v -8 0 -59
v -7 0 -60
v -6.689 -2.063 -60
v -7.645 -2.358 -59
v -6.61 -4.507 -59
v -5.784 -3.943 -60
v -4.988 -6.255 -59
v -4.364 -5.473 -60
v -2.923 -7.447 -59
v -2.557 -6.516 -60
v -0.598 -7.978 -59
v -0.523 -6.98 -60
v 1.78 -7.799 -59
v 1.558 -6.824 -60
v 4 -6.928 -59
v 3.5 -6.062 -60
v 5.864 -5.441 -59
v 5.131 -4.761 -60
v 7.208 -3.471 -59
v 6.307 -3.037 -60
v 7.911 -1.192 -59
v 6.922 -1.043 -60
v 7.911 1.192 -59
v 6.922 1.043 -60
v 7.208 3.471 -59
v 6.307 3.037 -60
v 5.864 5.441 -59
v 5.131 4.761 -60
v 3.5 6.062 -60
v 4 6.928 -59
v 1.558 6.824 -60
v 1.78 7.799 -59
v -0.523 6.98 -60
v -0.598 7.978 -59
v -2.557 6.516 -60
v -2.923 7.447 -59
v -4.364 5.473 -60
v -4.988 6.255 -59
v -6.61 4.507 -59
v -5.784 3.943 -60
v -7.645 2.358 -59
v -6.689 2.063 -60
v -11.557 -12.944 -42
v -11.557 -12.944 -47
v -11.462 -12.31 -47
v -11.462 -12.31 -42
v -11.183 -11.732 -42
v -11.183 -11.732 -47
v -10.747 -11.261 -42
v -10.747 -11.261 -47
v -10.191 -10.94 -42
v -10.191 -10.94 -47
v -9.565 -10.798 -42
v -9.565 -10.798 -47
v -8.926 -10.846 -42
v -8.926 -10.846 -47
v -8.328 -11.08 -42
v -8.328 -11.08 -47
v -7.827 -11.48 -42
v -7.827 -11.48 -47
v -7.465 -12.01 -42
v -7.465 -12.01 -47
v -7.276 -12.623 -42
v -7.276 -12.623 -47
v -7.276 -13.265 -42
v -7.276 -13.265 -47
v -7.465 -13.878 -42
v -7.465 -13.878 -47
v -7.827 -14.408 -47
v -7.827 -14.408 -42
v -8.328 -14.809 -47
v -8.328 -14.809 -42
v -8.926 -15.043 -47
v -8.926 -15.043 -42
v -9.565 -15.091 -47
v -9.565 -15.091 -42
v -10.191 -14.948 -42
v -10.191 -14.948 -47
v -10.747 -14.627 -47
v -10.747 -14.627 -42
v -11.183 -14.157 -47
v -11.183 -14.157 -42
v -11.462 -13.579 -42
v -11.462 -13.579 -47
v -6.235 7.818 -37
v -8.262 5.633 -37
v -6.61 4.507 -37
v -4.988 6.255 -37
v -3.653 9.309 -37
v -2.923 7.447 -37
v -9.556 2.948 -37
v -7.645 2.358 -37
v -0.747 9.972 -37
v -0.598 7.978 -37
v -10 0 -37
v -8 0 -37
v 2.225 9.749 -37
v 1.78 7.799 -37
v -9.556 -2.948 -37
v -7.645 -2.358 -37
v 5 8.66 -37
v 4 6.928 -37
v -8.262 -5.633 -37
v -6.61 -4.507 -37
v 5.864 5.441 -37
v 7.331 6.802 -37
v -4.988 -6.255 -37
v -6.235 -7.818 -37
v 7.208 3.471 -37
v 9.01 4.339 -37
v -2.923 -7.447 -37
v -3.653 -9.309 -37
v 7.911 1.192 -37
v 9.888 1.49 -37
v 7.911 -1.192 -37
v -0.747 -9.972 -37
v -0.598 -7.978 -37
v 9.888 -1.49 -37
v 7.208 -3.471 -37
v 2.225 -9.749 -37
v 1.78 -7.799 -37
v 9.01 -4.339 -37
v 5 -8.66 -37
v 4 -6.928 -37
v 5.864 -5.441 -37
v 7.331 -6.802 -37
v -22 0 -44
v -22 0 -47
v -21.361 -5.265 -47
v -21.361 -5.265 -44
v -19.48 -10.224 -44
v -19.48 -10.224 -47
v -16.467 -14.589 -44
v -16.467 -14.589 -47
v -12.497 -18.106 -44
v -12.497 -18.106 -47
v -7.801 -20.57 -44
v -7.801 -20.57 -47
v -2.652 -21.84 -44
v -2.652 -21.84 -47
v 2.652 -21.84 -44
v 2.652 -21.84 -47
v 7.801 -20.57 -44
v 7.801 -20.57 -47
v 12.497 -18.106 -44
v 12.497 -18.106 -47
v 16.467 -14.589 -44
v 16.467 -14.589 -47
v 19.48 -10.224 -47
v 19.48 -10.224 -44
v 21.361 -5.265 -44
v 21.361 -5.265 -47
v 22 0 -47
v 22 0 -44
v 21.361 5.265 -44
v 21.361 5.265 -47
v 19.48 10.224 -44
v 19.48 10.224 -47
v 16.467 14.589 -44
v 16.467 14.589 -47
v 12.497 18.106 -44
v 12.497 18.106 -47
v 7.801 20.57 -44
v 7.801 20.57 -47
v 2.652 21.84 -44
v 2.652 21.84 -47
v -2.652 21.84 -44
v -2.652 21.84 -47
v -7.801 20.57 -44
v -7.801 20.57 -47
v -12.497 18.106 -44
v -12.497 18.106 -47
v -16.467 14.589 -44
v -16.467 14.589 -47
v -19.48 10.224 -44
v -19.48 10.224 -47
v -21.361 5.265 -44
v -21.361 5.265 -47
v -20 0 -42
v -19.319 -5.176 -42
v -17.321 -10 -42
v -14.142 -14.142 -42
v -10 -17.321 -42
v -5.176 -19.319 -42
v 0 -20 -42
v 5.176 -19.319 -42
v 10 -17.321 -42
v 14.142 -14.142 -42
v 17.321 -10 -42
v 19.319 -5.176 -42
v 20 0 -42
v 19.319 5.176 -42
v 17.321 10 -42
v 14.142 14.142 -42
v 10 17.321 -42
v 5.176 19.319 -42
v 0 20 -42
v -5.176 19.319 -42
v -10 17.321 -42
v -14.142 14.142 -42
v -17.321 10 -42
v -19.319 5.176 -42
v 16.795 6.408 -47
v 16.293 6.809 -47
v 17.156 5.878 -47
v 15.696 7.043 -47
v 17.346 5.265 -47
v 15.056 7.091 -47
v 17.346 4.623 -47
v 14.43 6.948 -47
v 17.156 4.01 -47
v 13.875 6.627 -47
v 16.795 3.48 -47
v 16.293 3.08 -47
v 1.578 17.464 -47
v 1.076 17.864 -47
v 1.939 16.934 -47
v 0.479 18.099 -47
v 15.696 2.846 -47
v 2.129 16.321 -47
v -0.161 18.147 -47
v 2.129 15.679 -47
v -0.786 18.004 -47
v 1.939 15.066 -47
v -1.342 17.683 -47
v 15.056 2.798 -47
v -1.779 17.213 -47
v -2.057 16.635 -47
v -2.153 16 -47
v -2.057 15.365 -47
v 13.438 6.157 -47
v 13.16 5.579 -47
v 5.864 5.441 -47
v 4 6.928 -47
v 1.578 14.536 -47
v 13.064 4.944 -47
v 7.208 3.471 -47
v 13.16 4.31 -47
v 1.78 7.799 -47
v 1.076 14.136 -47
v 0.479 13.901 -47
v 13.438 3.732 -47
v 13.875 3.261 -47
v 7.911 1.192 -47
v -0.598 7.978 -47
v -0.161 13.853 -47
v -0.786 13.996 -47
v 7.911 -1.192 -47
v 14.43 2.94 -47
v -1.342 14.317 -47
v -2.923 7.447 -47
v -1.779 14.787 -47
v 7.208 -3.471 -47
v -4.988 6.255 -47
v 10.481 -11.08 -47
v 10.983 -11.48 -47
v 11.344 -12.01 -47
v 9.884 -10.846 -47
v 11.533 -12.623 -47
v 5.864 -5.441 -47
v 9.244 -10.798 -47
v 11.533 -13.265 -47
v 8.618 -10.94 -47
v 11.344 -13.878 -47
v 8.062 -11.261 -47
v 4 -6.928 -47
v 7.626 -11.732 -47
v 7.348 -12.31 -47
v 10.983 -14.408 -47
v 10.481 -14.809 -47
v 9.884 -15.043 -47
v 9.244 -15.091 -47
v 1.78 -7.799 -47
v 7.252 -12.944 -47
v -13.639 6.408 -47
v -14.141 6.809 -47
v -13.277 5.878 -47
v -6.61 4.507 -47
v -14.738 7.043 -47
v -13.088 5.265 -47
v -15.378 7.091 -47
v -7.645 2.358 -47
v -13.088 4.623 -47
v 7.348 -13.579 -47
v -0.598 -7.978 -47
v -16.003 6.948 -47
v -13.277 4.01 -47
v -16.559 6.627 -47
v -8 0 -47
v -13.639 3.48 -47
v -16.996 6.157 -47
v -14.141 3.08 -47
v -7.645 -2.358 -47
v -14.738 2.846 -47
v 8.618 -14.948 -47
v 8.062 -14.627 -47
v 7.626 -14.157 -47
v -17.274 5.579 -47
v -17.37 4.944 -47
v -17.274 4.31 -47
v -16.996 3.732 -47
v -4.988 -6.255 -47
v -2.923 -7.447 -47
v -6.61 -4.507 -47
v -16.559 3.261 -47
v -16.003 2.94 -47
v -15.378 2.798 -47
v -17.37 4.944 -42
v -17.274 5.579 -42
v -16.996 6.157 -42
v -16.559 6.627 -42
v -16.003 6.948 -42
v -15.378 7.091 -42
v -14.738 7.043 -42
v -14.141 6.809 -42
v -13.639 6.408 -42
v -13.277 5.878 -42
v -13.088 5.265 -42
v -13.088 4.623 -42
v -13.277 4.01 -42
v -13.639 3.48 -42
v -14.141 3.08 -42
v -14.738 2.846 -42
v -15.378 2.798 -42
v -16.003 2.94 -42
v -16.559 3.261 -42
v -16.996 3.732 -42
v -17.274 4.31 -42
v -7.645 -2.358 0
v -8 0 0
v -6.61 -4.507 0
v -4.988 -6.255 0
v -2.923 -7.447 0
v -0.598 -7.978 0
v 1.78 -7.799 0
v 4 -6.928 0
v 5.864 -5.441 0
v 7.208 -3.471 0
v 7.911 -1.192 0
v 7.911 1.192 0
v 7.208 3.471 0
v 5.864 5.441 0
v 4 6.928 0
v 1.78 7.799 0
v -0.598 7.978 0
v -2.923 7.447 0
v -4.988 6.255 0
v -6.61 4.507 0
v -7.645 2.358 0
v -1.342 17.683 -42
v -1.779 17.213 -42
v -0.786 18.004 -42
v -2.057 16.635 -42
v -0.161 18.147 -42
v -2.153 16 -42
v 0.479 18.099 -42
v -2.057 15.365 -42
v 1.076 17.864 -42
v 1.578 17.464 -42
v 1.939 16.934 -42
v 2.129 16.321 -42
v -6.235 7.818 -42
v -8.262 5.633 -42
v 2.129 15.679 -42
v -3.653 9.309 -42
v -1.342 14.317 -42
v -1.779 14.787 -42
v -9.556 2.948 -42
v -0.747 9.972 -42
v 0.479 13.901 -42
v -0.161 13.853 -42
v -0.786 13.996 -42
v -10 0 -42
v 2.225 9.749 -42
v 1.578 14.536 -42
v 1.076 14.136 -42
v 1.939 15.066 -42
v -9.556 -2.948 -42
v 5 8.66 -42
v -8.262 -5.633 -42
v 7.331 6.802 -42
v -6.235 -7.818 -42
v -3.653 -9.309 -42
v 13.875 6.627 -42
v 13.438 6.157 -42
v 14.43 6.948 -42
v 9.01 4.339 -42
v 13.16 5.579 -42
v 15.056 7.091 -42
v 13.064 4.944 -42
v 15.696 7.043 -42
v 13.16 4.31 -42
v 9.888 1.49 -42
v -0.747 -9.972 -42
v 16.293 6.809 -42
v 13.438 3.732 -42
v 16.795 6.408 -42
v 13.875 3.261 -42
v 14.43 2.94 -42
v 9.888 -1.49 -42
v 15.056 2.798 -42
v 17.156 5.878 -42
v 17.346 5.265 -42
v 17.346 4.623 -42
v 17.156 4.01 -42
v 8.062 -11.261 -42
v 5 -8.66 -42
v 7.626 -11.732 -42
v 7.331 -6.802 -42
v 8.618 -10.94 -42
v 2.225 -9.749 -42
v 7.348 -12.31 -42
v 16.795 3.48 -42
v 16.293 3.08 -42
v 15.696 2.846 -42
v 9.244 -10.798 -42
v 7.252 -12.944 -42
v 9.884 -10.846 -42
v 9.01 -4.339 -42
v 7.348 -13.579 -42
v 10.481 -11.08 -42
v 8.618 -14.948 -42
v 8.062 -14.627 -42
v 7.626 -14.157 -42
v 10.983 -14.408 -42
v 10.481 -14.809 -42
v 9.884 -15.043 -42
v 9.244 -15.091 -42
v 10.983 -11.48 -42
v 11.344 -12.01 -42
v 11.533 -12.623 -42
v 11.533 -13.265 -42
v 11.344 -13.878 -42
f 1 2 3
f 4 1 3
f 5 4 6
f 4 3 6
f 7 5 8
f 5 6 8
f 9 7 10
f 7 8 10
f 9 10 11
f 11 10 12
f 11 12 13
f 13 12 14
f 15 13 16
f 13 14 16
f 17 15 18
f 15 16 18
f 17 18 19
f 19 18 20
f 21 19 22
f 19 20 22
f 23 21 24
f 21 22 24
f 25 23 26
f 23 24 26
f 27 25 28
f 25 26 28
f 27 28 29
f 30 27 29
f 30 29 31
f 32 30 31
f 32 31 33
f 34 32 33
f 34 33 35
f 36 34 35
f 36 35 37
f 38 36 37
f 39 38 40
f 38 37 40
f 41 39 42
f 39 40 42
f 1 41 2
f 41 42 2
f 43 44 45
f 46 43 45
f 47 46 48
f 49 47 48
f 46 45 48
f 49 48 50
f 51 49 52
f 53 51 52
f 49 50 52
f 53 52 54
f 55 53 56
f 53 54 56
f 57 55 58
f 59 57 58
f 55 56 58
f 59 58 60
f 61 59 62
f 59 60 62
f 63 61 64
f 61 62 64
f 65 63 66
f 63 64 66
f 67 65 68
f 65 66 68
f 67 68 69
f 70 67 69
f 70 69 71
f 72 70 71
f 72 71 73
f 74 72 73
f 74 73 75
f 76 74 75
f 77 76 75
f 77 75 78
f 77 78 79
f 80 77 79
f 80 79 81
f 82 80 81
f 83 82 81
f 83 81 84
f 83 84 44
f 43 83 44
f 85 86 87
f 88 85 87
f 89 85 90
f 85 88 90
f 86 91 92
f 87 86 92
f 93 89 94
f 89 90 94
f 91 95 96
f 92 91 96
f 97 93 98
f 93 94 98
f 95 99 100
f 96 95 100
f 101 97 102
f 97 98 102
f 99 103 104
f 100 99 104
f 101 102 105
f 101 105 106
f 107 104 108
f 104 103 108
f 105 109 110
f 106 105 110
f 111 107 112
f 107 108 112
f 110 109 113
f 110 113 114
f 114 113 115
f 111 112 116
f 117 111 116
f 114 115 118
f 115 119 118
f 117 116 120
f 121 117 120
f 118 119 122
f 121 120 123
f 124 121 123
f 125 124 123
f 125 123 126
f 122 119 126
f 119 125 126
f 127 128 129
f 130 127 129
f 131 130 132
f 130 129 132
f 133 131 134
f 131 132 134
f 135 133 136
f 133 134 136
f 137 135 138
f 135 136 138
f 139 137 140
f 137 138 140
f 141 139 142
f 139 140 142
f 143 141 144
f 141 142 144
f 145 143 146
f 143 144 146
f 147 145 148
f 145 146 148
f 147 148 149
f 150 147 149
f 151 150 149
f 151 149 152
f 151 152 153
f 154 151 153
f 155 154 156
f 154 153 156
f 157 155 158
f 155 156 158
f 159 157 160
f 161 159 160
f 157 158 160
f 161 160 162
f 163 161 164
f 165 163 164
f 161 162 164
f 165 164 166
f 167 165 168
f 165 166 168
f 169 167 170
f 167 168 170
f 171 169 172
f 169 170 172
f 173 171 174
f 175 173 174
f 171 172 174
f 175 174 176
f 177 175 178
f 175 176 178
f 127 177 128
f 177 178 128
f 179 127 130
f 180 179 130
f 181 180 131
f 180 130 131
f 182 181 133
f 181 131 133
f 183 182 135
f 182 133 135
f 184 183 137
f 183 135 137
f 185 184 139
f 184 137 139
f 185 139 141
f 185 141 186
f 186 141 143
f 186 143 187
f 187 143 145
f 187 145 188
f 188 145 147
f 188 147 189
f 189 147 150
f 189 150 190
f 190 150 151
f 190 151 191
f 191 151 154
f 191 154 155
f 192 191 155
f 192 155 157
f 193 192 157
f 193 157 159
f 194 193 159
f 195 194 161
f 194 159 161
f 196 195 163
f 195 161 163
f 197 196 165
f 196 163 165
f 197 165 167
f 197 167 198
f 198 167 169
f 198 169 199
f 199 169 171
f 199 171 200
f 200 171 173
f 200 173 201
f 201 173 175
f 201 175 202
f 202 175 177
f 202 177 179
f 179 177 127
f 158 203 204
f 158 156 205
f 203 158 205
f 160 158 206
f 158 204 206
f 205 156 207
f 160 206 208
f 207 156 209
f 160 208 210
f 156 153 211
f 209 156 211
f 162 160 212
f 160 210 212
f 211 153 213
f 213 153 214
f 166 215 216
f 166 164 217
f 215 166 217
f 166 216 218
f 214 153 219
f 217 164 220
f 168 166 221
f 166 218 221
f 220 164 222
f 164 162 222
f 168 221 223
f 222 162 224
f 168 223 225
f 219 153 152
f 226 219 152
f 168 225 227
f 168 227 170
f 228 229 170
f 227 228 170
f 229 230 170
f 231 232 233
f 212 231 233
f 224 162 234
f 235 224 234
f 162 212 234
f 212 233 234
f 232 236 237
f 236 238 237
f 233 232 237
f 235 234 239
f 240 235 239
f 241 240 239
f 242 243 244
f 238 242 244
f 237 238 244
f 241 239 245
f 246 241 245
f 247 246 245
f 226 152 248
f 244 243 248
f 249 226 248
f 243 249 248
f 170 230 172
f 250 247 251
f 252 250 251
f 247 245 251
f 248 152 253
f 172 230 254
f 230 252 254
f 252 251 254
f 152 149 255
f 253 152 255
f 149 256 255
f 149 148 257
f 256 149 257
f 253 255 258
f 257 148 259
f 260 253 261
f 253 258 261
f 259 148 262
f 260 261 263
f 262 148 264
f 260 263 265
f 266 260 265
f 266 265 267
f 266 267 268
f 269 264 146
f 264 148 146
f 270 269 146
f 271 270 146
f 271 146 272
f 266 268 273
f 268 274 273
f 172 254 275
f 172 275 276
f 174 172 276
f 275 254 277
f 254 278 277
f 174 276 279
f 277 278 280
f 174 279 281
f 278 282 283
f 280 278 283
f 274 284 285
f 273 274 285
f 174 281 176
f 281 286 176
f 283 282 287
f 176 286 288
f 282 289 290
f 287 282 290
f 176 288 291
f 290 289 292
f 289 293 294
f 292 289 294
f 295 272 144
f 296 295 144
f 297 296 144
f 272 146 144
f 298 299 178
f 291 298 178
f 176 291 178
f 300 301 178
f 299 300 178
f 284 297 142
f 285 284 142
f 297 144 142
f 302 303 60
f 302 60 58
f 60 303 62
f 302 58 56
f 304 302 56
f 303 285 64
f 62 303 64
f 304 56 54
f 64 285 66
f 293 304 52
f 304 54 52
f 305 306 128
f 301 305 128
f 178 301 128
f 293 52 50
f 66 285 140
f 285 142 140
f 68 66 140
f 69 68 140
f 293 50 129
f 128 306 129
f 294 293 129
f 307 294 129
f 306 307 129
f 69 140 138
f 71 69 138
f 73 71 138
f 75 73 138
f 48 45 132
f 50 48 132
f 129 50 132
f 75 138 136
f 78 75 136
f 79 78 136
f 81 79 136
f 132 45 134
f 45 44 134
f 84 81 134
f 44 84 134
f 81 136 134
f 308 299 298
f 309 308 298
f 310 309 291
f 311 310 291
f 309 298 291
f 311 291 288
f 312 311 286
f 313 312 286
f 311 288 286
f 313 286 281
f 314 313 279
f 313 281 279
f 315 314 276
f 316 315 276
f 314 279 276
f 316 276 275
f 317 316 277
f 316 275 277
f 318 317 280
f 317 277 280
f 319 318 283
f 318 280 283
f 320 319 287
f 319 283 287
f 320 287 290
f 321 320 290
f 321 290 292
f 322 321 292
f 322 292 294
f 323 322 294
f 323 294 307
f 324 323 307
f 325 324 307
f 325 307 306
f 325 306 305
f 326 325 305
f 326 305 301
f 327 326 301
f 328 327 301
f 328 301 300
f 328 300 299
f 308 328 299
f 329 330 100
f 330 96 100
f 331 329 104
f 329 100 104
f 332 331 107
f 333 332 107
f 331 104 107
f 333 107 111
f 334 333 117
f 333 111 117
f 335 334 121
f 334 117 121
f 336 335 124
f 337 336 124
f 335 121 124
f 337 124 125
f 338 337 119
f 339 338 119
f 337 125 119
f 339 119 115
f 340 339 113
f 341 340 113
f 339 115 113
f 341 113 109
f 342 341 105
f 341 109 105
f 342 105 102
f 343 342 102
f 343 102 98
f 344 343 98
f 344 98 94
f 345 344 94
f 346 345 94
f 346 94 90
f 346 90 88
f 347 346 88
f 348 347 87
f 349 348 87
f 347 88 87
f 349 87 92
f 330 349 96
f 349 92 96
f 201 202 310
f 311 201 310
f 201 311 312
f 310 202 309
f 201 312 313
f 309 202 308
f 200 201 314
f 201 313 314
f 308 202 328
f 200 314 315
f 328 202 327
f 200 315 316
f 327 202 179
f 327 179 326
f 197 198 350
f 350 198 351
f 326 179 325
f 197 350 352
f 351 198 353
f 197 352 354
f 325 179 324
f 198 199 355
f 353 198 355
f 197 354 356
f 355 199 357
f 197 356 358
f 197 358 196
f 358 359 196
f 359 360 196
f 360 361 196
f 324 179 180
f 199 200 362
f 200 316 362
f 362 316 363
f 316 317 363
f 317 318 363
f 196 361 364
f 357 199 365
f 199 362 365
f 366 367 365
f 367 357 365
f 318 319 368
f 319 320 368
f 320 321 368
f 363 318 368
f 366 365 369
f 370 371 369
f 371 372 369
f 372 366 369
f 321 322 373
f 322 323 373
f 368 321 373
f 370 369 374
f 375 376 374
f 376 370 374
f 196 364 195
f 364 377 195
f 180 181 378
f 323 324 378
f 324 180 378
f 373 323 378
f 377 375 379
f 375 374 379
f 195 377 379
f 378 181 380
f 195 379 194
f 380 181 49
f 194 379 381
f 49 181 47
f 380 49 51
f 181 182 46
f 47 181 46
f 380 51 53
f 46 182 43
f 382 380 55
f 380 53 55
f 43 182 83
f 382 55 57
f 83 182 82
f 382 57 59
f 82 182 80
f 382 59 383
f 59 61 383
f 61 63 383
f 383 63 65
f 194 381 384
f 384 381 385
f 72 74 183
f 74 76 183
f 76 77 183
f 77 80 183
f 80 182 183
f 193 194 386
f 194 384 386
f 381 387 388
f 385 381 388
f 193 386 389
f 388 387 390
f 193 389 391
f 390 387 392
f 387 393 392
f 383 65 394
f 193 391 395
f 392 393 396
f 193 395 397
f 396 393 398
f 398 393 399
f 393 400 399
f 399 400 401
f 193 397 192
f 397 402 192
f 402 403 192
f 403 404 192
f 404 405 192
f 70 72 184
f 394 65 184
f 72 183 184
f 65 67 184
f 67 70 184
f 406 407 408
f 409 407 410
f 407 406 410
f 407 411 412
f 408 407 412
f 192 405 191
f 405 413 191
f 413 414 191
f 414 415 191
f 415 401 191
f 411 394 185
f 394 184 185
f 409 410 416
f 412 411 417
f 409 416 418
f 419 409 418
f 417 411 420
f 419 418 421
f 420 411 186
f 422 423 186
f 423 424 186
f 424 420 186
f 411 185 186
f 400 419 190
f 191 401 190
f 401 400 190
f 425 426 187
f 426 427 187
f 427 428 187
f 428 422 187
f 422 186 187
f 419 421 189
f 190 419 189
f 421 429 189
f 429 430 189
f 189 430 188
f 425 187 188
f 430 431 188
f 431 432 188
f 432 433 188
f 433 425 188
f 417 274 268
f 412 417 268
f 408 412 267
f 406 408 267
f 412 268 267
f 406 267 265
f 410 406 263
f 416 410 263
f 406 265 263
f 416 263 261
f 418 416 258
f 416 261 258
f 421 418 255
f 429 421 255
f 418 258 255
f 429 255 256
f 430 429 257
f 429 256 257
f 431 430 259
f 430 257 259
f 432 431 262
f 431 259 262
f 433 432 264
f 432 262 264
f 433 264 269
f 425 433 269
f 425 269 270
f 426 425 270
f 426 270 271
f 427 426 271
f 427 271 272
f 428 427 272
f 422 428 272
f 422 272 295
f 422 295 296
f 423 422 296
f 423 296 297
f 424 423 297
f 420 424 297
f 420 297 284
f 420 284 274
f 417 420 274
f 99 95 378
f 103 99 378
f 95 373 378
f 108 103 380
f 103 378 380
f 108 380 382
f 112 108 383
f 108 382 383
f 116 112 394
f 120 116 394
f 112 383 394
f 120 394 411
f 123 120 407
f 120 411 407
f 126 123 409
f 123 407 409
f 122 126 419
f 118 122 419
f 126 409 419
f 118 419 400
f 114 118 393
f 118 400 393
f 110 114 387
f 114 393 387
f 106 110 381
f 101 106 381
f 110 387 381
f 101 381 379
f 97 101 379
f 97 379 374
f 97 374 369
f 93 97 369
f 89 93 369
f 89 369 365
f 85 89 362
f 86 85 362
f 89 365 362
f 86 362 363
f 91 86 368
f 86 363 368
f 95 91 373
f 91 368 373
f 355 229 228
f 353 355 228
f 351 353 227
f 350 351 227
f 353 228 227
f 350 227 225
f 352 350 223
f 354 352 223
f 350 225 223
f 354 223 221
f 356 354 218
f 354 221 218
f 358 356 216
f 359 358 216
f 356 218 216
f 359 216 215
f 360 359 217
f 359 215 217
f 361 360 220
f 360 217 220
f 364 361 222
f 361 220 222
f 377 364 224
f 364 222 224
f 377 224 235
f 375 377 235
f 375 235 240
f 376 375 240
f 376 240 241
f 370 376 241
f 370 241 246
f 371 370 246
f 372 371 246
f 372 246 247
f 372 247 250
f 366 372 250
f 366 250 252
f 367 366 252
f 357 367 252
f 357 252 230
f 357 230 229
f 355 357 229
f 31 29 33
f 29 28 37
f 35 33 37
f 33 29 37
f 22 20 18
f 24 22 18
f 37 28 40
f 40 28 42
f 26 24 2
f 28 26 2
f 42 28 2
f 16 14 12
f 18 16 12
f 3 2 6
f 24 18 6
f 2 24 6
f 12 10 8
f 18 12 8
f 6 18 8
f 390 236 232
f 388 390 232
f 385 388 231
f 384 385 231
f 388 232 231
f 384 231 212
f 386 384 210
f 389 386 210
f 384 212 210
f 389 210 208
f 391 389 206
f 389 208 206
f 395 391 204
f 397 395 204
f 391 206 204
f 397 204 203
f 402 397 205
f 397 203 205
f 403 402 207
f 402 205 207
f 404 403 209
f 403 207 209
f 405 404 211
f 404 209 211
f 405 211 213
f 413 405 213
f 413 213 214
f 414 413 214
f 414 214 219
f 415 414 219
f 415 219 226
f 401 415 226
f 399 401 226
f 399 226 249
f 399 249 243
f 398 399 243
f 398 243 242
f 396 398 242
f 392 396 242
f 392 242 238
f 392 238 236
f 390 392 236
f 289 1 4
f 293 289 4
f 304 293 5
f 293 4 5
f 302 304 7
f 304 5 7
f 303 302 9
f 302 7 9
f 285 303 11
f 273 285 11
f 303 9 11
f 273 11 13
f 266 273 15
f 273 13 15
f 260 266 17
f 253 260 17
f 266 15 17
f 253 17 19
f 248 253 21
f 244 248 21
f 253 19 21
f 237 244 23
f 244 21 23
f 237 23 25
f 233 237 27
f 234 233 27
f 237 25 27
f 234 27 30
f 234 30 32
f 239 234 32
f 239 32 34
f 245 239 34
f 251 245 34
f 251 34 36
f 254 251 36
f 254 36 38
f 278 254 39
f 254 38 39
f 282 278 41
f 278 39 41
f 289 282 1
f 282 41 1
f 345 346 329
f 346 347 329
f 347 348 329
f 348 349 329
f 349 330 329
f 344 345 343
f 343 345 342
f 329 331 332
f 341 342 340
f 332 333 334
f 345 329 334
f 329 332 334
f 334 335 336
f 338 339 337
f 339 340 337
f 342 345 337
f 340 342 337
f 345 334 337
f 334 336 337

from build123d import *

# Parameters (mm, degrees)
CHAMFER1_SIZE             = 2
F_8_CLEARANCE_HOLE1_D     = 4.3053
F_8_CLEARANCE_HOLE1_DEPTH = 12
F_8_CLEARANCE_HOLE1_TIP   = 1.293442612
CHAMFER2_SIZE             = 1


with BuildPart() as part:
    # Sketch3 → Revolve1 (revolve)
    with BuildSketch(Plane(origin=(0, 0, 0), x_dir=(1, 0, 0), z_dir=(0, 1, 0))):
        Polygon((0, 0), (-8, 0), (-8, 37), (-10, 37), (-10, 42), (-22, 42), (-22, 47), (-8, 47), (-8, 60), (0, 60), align=None)
    revolve(axis=Axis((0, 0, -60), (0, 0, 1)))

    # Chamfer1
    chamfer1_edges = [part.edges().sort_by_distance(p)[0] for p in [
        (22, 0, -42),
    ]]
    chamfer(chamfer1_edges, length=CHAMFER1_SIZE)

    # #8 Clearance Hole1
    with Locations(Plane.XY.offset(-42)):
        with Locations((0, 16), (15.216904261, 4.94427191), (9.404564037, -12.94427191), (-9.404564037, -12.94427191), (-15.216904261, 4.94427191)):
            Hole(F_8_CLEARANCE_HOLE1_D / 2, depth=F_8_CLEARANCE_HOLE1_DEPTH)
            with Locations((0, 0, -(F_8_CLEARANCE_HOLE1_DEPTH + F_8_CLEARANCE_HOLE1_TIP / 2))):  # 118° drill point
                Cone(0, F_8_CLEARANCE_HOLE1_D / 2, F_8_CLEARANCE_HOLE1_TIP, mode=Mode.SUBTRACT)

    # Chamfer2
    chamfer2_edges = [part.edges().sort_by_distance(p)[0] for p in [
        (8, 0, -60),
    ]]
    chamfer(chamfer2_edges, length=CHAMFER2_SIZE)


solid = part.part
